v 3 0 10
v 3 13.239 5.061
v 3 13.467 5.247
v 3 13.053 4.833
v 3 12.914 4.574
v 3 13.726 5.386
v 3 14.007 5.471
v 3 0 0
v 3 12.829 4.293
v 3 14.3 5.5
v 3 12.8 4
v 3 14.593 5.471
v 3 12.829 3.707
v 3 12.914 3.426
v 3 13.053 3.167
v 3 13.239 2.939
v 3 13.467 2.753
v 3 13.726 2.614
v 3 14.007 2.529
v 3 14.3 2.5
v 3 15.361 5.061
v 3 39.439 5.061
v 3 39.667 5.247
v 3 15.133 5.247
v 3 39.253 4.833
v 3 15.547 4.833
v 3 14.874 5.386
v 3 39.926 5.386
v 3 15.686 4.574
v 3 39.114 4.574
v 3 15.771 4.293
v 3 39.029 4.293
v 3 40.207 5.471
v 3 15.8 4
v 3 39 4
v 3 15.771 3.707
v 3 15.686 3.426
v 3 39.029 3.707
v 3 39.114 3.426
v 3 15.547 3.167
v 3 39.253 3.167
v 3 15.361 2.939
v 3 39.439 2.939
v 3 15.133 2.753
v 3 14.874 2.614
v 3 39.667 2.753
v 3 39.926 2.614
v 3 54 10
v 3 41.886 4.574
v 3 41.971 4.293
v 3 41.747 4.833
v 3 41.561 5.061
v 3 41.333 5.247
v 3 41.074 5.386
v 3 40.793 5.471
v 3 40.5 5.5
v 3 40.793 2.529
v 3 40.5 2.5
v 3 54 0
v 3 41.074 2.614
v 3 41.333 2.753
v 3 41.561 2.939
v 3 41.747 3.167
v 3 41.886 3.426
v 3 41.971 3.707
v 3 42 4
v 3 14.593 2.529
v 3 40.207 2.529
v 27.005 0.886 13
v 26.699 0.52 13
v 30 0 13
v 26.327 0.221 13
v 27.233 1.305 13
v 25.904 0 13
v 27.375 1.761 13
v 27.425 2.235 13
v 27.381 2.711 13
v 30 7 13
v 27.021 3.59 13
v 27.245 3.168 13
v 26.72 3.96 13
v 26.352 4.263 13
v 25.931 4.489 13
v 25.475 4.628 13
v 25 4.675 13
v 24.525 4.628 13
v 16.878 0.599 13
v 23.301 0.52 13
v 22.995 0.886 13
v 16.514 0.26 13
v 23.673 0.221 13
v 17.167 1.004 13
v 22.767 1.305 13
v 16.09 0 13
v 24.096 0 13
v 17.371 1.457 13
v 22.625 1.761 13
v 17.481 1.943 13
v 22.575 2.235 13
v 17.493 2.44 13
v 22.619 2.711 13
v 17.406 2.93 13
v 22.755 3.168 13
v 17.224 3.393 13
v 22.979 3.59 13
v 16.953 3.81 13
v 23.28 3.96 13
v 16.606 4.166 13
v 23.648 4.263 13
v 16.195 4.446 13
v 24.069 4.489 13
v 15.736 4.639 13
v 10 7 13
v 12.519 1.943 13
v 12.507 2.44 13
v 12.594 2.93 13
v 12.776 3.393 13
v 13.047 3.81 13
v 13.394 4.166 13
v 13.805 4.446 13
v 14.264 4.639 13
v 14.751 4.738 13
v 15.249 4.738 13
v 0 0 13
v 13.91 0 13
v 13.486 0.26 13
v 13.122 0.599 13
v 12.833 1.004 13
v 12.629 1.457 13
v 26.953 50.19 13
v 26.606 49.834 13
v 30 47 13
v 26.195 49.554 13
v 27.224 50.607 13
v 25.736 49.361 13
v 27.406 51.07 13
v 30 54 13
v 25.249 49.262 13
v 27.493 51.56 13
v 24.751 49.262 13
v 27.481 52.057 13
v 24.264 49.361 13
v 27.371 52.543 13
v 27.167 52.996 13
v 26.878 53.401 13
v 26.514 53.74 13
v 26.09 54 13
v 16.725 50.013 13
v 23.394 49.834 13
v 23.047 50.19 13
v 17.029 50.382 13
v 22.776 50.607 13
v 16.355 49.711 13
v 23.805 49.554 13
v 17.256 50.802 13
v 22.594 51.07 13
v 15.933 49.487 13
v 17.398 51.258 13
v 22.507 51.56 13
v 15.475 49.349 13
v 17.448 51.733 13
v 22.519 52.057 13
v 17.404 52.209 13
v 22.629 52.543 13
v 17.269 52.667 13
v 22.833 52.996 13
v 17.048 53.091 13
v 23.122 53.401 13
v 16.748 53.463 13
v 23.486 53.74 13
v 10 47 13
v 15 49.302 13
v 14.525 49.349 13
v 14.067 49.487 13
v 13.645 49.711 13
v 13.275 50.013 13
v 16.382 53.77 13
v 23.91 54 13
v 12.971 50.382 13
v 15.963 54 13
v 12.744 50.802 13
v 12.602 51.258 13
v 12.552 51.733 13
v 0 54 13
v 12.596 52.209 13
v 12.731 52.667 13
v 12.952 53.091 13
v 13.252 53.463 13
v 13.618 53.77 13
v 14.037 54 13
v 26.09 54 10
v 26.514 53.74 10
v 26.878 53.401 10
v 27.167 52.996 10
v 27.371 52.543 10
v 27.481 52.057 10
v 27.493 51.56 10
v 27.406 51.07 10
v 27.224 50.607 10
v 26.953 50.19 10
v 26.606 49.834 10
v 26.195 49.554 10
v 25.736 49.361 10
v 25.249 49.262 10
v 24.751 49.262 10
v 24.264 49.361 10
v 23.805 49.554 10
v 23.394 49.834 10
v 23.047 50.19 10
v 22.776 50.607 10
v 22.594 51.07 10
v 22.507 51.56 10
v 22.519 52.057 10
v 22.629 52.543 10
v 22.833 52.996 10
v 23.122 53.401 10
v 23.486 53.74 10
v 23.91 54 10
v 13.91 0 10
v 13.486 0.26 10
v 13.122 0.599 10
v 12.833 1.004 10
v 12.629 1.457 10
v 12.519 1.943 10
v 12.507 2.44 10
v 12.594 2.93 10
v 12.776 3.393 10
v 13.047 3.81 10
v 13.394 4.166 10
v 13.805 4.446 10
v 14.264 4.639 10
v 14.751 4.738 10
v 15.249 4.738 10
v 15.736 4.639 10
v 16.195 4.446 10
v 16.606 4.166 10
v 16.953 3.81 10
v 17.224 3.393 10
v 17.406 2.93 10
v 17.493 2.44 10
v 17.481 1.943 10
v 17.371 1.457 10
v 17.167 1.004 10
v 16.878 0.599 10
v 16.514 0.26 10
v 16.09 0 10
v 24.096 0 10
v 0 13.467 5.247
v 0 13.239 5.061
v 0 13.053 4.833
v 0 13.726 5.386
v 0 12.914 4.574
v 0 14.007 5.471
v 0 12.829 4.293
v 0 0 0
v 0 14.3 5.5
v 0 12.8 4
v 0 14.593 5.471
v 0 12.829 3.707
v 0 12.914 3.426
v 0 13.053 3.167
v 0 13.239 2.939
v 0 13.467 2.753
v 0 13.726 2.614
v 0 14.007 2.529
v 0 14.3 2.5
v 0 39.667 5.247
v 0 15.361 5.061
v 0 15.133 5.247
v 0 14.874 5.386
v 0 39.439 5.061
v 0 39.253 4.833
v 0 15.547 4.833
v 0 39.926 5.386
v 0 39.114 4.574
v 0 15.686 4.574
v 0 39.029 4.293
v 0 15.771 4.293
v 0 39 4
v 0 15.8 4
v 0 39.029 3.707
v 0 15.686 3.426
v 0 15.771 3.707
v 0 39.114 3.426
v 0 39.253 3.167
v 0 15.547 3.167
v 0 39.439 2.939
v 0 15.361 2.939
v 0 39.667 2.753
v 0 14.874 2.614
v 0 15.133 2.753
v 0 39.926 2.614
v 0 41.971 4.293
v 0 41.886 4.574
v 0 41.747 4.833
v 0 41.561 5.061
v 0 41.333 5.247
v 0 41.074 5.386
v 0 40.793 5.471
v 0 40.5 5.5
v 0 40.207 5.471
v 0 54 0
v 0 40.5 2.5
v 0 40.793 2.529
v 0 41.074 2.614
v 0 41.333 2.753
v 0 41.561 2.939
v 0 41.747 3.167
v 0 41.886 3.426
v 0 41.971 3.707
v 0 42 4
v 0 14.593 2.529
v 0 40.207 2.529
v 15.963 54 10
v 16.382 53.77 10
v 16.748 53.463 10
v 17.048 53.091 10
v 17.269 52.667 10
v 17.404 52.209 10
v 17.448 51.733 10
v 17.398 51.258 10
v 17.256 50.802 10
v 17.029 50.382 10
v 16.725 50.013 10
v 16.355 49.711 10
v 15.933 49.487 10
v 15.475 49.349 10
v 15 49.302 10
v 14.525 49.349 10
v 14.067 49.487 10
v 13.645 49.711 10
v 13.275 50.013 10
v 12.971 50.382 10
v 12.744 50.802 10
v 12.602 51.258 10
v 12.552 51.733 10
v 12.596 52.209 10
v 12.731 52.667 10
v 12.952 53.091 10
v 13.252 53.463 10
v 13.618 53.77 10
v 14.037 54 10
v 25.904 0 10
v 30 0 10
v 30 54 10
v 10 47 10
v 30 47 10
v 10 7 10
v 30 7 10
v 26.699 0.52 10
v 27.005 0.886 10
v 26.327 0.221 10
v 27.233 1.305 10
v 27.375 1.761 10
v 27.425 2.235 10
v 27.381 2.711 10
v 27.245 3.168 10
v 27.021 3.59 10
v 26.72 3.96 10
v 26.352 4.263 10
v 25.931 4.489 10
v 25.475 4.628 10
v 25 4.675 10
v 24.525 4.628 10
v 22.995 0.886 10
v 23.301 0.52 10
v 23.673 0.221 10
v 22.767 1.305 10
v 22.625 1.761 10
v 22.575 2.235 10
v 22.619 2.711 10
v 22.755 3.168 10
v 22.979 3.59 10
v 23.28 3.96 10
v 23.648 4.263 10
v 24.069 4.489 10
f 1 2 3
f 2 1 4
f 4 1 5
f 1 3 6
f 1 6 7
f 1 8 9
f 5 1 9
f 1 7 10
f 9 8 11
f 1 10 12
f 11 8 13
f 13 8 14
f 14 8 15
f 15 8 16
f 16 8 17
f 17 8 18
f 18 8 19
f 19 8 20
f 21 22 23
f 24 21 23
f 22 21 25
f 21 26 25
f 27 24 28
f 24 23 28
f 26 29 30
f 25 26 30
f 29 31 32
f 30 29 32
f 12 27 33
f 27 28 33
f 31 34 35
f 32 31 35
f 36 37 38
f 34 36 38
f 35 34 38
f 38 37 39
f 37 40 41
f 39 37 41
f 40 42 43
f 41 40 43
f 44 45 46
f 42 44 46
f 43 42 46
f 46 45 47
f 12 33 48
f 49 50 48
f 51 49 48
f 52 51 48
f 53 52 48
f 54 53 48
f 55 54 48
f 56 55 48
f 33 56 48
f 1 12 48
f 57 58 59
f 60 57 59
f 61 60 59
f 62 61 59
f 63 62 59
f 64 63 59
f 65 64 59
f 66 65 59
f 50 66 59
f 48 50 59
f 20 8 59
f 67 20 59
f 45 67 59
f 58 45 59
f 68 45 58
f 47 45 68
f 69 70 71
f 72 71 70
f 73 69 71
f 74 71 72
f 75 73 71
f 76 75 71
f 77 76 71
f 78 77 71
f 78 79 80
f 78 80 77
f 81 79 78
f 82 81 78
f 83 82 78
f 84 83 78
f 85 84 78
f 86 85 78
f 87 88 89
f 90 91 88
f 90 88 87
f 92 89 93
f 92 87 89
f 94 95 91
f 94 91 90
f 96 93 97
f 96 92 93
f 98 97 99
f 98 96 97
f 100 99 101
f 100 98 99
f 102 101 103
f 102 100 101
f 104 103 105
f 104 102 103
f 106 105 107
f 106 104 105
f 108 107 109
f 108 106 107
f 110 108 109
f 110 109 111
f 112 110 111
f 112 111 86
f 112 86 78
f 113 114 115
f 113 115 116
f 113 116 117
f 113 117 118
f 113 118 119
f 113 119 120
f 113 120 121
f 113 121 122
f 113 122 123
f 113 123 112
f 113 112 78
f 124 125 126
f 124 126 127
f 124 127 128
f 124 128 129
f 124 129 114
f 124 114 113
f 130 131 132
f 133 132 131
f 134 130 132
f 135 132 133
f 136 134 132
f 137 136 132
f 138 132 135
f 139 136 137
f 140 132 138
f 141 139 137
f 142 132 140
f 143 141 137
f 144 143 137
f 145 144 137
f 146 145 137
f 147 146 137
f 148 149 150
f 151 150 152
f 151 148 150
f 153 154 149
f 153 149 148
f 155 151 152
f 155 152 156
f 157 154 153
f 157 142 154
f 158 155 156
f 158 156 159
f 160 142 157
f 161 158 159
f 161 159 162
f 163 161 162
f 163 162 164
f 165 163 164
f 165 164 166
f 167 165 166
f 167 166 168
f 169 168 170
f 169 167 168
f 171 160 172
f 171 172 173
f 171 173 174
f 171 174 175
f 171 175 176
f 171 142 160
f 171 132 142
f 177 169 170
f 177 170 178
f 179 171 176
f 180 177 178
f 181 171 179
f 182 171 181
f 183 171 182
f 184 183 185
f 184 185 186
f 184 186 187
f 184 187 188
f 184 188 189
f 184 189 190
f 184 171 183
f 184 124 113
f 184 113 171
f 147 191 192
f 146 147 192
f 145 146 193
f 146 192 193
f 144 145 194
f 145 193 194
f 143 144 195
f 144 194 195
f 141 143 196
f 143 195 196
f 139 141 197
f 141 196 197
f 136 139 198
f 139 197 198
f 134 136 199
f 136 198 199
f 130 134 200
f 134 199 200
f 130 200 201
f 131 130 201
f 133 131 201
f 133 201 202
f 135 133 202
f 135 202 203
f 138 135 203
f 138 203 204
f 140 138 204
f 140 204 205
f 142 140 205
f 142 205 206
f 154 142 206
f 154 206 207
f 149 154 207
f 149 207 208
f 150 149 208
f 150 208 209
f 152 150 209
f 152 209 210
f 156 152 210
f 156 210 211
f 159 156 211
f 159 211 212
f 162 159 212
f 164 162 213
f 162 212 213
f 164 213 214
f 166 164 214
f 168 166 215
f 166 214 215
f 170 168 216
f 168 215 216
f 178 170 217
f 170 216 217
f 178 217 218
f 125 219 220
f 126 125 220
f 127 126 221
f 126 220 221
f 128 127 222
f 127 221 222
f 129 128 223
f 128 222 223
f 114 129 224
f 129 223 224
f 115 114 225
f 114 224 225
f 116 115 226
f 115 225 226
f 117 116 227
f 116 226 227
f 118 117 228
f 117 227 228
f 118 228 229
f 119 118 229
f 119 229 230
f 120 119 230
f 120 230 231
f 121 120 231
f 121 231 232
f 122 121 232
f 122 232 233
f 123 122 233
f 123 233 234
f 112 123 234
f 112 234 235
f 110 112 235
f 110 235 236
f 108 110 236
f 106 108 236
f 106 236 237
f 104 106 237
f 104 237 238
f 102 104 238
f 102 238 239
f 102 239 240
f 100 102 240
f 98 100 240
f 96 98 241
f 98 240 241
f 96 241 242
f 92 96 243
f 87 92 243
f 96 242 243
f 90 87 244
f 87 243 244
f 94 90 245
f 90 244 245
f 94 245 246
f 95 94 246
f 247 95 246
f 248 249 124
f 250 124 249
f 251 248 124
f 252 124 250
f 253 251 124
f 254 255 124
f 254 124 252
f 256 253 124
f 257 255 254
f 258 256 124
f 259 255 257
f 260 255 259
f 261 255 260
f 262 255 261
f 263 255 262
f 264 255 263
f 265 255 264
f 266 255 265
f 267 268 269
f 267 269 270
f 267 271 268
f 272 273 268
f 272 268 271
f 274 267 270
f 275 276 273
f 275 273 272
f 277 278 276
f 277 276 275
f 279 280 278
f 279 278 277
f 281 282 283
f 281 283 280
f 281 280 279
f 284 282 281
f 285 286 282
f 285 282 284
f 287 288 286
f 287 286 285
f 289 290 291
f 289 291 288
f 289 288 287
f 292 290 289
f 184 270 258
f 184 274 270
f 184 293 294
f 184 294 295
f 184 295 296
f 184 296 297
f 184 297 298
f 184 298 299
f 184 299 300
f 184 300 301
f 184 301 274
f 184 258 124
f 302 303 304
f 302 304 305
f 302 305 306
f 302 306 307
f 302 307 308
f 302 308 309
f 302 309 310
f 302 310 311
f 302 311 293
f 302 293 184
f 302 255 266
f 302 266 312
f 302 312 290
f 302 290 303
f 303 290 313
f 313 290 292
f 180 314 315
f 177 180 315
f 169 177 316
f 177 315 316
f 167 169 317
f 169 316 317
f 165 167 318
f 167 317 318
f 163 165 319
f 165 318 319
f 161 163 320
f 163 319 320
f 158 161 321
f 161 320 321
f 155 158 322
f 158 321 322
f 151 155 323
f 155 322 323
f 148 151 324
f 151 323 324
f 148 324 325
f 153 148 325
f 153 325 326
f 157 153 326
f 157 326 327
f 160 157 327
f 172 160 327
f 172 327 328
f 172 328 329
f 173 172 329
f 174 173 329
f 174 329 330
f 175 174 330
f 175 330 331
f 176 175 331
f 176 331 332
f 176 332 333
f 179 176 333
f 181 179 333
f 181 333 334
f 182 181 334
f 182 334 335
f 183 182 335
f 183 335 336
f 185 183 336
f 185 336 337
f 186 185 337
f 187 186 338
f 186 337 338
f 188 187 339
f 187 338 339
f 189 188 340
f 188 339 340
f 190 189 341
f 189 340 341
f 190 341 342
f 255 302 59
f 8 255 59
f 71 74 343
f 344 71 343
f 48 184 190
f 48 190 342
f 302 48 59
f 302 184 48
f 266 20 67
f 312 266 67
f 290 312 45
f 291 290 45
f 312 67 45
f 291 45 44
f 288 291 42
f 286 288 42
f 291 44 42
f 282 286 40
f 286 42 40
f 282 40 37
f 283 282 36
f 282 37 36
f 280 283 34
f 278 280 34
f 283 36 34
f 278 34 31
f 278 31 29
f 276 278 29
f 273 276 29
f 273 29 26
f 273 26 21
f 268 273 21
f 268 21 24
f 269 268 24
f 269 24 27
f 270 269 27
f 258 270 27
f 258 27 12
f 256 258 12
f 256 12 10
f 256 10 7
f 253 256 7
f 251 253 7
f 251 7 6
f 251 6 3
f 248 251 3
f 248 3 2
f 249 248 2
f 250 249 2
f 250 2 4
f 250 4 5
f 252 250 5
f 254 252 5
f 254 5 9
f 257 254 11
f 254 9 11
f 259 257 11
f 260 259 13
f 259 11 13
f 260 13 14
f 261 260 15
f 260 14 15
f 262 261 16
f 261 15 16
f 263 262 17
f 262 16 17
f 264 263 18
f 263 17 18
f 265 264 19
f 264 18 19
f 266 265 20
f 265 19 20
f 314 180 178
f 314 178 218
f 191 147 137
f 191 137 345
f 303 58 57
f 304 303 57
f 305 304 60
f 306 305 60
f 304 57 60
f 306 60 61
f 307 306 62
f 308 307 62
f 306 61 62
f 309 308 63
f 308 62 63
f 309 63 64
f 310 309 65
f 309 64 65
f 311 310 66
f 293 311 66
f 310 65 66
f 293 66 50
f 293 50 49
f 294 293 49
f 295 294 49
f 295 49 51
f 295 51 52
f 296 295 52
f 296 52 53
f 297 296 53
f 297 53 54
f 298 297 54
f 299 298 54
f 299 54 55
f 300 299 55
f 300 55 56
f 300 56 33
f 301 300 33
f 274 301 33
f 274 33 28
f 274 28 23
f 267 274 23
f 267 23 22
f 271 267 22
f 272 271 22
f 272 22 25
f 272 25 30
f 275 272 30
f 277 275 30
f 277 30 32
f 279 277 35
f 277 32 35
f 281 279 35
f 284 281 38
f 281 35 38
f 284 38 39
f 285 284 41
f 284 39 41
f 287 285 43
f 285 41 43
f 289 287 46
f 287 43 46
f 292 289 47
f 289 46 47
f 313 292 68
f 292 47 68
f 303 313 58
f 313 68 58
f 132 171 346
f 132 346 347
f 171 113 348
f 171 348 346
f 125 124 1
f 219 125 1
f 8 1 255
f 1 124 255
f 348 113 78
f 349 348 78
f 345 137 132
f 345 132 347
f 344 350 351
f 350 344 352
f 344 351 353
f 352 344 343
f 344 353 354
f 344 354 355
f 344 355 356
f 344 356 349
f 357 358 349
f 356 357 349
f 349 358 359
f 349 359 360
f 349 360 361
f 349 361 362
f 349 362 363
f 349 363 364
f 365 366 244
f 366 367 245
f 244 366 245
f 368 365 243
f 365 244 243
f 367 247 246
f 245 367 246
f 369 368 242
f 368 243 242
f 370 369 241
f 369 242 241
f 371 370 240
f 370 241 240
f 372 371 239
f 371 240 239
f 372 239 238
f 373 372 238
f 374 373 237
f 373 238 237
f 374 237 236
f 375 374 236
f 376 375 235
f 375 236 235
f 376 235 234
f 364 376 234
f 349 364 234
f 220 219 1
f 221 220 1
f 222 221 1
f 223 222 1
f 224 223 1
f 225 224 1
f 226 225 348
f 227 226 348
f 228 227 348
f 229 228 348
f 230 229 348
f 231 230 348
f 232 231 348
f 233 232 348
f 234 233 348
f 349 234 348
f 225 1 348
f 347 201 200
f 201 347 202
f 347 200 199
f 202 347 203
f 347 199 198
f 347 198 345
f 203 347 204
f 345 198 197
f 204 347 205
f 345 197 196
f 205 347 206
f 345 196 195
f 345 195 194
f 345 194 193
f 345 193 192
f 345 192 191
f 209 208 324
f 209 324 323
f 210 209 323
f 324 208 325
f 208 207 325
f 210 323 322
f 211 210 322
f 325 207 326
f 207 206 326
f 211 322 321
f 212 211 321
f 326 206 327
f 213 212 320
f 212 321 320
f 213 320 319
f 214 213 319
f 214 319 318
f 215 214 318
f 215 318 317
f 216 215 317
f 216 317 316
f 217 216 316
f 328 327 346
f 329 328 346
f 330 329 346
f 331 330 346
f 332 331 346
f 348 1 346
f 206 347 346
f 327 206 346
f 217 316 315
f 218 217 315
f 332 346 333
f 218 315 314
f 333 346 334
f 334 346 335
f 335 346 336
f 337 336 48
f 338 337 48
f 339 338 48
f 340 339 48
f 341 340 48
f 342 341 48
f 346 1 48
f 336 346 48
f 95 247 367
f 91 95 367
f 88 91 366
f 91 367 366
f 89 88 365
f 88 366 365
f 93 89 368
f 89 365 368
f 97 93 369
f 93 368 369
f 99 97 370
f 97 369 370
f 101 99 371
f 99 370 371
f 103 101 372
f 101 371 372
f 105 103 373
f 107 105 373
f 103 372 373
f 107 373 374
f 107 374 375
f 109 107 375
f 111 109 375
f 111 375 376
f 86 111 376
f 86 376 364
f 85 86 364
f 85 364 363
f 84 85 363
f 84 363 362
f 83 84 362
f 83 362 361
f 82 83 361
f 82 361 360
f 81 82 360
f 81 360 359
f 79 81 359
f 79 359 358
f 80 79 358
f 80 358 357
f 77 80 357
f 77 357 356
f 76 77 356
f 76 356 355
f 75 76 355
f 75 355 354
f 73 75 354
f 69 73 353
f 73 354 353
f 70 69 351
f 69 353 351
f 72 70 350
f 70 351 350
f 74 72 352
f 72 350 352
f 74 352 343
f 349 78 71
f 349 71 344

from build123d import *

# Parameters (mm, degrees)
SKETCH_1_W          = 3
SKETCH_1_H          = 54
EXTRUDE_1_DEPTH     = 13
SKETCH_3_R          = 1.5
CUT_EXTRUDE_1_DEPTH = 56.623735941
SKETCH_4_W          = 3
SKETCH_4_H          = 54
EXTRUDE_2_DEPTH     = 27
SKETCH_5_W          = 20
SKETCH_5_H          = 40
CUT_EXTRUDE_2_DEPTH = 64.126856408
SKETCH_6_R          = 2.5
SKETCH_6_R_2        = 2.424949467
SKETCH_6_R_3        = 2.447616221
CUT_EXTRUDE_3_DEPTH = 63.577951389


with BuildPart() as part:
    # 草图1 → 凸台-拉伸1 (new body)
    with BuildSketch(Plane.XY):
        with Locations((1.5, 27)):
            Rectangle(SKETCH_1_W, SKETCH_1_H)
    extrude(amount=EXTRUDE_1_DEPTH)

    # 草图3 → 切除-拉伸1 (cut, through all)
    with BuildSketch(Plane(origin=(3, 0, 0), x_dir=(0, 0, -1), z_dir=(1, 0, 0))):
        with Locations((-4, 40.5)):
            Circle(SKETCH_3_R)
        with Locations((-4, 14.3)):
            Circle(SKETCH_3_R)
    extrude(amount=-CUT_EXTRUDE_1_DEPTH, mode=Mode.SUBTRACT)

    # 草图4 → 凸台-拉伸2 (add)
    with BuildSketch(Plane(origin=(3, 0, 0), x_dir=(0, 0, -1), z_dir=(1, 0, 0))):
        with Locations((-11.5, 27)):
            Rectangle(SKETCH_4_W, SKETCH_4_H)
    extrude(amount=EXTRUDE_2_DEPTH)

    # 草图5 → 切除-拉伸2 (cut, through all)
    with BuildSketch(Plane.XY.offset(13)):
        with Locations((20, 27)):
            Rectangle(SKETCH_5_W, SKETCH_5_H)
    extrude(amount=-CUT_EXTRUDE_2_DEPTH, mode=Mode.SUBTRACT)

    # 草图6 → 切除-拉伸3 (cut, through all)
    with BuildSketch(Plane(origin=(0, 0, 10), x_dir=(-1, 0, 0), z_dir=(0, 0, -1))):
        with Locations((-25, 51.75)):
            Circle(SKETCH_6_R)
        with Locations((-25, 2.25)):
            Circle(SKETCH_6_R_2)
        with Locations((-15, 51.75)):
            Circle(SKETCH_6_R_3)
        with Locations((-15, 2.25)):
            Circle(SKETCH_6_R)
    extrude(amount=-CUT_EXTRUDE_3_DEPTH, mode=Mode.SUBTRACT)


solid = part.part
